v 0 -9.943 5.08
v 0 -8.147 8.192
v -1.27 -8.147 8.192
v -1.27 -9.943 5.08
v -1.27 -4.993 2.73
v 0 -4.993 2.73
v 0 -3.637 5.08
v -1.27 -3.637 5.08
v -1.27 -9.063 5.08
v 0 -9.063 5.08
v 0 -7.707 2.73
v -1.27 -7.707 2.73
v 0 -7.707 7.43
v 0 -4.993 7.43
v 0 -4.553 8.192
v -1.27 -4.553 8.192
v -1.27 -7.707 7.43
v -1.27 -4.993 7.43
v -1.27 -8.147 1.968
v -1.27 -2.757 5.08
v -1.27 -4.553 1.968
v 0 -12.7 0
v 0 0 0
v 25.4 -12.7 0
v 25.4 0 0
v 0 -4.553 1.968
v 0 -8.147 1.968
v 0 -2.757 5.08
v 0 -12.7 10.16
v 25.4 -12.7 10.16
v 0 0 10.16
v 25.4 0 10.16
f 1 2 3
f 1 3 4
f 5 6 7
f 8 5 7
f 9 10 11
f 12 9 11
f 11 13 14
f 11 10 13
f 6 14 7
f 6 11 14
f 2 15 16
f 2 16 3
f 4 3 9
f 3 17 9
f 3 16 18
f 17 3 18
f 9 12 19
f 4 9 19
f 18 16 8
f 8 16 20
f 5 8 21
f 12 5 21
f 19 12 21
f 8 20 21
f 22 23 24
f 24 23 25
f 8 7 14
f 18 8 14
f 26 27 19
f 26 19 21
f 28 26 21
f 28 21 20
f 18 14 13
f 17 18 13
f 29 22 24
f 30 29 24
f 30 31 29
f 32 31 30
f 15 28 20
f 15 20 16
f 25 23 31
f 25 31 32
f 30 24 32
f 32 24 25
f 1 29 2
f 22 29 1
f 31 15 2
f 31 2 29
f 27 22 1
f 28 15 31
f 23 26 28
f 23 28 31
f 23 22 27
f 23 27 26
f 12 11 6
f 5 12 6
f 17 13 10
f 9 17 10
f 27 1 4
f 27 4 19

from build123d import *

# Parameters (mm, degrees)
SKETCH1_W           = 25.4
SKETCH1_H           = 12.7
BOSS_EXTRUDE1_DEPTH = 10.16
BOSS_EXTRUDE2_DEPTH = 1.27


with BuildPart() as part:
    # Sketch1 → Boss-Extrude1 (new body)
    with BuildSketch(Plane.XY):
        with Locations((12.7, -6.35)):
            Rectangle(SKETCH1_W, SKETCH1_H)
    extrude(amount=BOSS_EXTRUDE1_DEPTH)

    # Sketch2 → Boss-Extrude2 (add)
    with BuildSketch(Plane.ZY):
        Polygon((5.08, -2.756658991), (8.191924598, -4.553329495), (8.191924598, -8.146670505), (5.08, -9.943341009), (1.968075402, -8.146670505), (1.968075402, -4.553329495), align=None)
        Polygon((7.429924598, -4.993270401), (7.429924598, -7.706729599), (5.08, -9.063459199), (2.730075402, -7.706729599), (2.730075402, -4.993270401), (5.08, -3.636540801), align=None, mode=Mode.SUBTRACT)
    extrude(amount=BOSS_EXTRUDE2_DEPTH)


solid = part.part
